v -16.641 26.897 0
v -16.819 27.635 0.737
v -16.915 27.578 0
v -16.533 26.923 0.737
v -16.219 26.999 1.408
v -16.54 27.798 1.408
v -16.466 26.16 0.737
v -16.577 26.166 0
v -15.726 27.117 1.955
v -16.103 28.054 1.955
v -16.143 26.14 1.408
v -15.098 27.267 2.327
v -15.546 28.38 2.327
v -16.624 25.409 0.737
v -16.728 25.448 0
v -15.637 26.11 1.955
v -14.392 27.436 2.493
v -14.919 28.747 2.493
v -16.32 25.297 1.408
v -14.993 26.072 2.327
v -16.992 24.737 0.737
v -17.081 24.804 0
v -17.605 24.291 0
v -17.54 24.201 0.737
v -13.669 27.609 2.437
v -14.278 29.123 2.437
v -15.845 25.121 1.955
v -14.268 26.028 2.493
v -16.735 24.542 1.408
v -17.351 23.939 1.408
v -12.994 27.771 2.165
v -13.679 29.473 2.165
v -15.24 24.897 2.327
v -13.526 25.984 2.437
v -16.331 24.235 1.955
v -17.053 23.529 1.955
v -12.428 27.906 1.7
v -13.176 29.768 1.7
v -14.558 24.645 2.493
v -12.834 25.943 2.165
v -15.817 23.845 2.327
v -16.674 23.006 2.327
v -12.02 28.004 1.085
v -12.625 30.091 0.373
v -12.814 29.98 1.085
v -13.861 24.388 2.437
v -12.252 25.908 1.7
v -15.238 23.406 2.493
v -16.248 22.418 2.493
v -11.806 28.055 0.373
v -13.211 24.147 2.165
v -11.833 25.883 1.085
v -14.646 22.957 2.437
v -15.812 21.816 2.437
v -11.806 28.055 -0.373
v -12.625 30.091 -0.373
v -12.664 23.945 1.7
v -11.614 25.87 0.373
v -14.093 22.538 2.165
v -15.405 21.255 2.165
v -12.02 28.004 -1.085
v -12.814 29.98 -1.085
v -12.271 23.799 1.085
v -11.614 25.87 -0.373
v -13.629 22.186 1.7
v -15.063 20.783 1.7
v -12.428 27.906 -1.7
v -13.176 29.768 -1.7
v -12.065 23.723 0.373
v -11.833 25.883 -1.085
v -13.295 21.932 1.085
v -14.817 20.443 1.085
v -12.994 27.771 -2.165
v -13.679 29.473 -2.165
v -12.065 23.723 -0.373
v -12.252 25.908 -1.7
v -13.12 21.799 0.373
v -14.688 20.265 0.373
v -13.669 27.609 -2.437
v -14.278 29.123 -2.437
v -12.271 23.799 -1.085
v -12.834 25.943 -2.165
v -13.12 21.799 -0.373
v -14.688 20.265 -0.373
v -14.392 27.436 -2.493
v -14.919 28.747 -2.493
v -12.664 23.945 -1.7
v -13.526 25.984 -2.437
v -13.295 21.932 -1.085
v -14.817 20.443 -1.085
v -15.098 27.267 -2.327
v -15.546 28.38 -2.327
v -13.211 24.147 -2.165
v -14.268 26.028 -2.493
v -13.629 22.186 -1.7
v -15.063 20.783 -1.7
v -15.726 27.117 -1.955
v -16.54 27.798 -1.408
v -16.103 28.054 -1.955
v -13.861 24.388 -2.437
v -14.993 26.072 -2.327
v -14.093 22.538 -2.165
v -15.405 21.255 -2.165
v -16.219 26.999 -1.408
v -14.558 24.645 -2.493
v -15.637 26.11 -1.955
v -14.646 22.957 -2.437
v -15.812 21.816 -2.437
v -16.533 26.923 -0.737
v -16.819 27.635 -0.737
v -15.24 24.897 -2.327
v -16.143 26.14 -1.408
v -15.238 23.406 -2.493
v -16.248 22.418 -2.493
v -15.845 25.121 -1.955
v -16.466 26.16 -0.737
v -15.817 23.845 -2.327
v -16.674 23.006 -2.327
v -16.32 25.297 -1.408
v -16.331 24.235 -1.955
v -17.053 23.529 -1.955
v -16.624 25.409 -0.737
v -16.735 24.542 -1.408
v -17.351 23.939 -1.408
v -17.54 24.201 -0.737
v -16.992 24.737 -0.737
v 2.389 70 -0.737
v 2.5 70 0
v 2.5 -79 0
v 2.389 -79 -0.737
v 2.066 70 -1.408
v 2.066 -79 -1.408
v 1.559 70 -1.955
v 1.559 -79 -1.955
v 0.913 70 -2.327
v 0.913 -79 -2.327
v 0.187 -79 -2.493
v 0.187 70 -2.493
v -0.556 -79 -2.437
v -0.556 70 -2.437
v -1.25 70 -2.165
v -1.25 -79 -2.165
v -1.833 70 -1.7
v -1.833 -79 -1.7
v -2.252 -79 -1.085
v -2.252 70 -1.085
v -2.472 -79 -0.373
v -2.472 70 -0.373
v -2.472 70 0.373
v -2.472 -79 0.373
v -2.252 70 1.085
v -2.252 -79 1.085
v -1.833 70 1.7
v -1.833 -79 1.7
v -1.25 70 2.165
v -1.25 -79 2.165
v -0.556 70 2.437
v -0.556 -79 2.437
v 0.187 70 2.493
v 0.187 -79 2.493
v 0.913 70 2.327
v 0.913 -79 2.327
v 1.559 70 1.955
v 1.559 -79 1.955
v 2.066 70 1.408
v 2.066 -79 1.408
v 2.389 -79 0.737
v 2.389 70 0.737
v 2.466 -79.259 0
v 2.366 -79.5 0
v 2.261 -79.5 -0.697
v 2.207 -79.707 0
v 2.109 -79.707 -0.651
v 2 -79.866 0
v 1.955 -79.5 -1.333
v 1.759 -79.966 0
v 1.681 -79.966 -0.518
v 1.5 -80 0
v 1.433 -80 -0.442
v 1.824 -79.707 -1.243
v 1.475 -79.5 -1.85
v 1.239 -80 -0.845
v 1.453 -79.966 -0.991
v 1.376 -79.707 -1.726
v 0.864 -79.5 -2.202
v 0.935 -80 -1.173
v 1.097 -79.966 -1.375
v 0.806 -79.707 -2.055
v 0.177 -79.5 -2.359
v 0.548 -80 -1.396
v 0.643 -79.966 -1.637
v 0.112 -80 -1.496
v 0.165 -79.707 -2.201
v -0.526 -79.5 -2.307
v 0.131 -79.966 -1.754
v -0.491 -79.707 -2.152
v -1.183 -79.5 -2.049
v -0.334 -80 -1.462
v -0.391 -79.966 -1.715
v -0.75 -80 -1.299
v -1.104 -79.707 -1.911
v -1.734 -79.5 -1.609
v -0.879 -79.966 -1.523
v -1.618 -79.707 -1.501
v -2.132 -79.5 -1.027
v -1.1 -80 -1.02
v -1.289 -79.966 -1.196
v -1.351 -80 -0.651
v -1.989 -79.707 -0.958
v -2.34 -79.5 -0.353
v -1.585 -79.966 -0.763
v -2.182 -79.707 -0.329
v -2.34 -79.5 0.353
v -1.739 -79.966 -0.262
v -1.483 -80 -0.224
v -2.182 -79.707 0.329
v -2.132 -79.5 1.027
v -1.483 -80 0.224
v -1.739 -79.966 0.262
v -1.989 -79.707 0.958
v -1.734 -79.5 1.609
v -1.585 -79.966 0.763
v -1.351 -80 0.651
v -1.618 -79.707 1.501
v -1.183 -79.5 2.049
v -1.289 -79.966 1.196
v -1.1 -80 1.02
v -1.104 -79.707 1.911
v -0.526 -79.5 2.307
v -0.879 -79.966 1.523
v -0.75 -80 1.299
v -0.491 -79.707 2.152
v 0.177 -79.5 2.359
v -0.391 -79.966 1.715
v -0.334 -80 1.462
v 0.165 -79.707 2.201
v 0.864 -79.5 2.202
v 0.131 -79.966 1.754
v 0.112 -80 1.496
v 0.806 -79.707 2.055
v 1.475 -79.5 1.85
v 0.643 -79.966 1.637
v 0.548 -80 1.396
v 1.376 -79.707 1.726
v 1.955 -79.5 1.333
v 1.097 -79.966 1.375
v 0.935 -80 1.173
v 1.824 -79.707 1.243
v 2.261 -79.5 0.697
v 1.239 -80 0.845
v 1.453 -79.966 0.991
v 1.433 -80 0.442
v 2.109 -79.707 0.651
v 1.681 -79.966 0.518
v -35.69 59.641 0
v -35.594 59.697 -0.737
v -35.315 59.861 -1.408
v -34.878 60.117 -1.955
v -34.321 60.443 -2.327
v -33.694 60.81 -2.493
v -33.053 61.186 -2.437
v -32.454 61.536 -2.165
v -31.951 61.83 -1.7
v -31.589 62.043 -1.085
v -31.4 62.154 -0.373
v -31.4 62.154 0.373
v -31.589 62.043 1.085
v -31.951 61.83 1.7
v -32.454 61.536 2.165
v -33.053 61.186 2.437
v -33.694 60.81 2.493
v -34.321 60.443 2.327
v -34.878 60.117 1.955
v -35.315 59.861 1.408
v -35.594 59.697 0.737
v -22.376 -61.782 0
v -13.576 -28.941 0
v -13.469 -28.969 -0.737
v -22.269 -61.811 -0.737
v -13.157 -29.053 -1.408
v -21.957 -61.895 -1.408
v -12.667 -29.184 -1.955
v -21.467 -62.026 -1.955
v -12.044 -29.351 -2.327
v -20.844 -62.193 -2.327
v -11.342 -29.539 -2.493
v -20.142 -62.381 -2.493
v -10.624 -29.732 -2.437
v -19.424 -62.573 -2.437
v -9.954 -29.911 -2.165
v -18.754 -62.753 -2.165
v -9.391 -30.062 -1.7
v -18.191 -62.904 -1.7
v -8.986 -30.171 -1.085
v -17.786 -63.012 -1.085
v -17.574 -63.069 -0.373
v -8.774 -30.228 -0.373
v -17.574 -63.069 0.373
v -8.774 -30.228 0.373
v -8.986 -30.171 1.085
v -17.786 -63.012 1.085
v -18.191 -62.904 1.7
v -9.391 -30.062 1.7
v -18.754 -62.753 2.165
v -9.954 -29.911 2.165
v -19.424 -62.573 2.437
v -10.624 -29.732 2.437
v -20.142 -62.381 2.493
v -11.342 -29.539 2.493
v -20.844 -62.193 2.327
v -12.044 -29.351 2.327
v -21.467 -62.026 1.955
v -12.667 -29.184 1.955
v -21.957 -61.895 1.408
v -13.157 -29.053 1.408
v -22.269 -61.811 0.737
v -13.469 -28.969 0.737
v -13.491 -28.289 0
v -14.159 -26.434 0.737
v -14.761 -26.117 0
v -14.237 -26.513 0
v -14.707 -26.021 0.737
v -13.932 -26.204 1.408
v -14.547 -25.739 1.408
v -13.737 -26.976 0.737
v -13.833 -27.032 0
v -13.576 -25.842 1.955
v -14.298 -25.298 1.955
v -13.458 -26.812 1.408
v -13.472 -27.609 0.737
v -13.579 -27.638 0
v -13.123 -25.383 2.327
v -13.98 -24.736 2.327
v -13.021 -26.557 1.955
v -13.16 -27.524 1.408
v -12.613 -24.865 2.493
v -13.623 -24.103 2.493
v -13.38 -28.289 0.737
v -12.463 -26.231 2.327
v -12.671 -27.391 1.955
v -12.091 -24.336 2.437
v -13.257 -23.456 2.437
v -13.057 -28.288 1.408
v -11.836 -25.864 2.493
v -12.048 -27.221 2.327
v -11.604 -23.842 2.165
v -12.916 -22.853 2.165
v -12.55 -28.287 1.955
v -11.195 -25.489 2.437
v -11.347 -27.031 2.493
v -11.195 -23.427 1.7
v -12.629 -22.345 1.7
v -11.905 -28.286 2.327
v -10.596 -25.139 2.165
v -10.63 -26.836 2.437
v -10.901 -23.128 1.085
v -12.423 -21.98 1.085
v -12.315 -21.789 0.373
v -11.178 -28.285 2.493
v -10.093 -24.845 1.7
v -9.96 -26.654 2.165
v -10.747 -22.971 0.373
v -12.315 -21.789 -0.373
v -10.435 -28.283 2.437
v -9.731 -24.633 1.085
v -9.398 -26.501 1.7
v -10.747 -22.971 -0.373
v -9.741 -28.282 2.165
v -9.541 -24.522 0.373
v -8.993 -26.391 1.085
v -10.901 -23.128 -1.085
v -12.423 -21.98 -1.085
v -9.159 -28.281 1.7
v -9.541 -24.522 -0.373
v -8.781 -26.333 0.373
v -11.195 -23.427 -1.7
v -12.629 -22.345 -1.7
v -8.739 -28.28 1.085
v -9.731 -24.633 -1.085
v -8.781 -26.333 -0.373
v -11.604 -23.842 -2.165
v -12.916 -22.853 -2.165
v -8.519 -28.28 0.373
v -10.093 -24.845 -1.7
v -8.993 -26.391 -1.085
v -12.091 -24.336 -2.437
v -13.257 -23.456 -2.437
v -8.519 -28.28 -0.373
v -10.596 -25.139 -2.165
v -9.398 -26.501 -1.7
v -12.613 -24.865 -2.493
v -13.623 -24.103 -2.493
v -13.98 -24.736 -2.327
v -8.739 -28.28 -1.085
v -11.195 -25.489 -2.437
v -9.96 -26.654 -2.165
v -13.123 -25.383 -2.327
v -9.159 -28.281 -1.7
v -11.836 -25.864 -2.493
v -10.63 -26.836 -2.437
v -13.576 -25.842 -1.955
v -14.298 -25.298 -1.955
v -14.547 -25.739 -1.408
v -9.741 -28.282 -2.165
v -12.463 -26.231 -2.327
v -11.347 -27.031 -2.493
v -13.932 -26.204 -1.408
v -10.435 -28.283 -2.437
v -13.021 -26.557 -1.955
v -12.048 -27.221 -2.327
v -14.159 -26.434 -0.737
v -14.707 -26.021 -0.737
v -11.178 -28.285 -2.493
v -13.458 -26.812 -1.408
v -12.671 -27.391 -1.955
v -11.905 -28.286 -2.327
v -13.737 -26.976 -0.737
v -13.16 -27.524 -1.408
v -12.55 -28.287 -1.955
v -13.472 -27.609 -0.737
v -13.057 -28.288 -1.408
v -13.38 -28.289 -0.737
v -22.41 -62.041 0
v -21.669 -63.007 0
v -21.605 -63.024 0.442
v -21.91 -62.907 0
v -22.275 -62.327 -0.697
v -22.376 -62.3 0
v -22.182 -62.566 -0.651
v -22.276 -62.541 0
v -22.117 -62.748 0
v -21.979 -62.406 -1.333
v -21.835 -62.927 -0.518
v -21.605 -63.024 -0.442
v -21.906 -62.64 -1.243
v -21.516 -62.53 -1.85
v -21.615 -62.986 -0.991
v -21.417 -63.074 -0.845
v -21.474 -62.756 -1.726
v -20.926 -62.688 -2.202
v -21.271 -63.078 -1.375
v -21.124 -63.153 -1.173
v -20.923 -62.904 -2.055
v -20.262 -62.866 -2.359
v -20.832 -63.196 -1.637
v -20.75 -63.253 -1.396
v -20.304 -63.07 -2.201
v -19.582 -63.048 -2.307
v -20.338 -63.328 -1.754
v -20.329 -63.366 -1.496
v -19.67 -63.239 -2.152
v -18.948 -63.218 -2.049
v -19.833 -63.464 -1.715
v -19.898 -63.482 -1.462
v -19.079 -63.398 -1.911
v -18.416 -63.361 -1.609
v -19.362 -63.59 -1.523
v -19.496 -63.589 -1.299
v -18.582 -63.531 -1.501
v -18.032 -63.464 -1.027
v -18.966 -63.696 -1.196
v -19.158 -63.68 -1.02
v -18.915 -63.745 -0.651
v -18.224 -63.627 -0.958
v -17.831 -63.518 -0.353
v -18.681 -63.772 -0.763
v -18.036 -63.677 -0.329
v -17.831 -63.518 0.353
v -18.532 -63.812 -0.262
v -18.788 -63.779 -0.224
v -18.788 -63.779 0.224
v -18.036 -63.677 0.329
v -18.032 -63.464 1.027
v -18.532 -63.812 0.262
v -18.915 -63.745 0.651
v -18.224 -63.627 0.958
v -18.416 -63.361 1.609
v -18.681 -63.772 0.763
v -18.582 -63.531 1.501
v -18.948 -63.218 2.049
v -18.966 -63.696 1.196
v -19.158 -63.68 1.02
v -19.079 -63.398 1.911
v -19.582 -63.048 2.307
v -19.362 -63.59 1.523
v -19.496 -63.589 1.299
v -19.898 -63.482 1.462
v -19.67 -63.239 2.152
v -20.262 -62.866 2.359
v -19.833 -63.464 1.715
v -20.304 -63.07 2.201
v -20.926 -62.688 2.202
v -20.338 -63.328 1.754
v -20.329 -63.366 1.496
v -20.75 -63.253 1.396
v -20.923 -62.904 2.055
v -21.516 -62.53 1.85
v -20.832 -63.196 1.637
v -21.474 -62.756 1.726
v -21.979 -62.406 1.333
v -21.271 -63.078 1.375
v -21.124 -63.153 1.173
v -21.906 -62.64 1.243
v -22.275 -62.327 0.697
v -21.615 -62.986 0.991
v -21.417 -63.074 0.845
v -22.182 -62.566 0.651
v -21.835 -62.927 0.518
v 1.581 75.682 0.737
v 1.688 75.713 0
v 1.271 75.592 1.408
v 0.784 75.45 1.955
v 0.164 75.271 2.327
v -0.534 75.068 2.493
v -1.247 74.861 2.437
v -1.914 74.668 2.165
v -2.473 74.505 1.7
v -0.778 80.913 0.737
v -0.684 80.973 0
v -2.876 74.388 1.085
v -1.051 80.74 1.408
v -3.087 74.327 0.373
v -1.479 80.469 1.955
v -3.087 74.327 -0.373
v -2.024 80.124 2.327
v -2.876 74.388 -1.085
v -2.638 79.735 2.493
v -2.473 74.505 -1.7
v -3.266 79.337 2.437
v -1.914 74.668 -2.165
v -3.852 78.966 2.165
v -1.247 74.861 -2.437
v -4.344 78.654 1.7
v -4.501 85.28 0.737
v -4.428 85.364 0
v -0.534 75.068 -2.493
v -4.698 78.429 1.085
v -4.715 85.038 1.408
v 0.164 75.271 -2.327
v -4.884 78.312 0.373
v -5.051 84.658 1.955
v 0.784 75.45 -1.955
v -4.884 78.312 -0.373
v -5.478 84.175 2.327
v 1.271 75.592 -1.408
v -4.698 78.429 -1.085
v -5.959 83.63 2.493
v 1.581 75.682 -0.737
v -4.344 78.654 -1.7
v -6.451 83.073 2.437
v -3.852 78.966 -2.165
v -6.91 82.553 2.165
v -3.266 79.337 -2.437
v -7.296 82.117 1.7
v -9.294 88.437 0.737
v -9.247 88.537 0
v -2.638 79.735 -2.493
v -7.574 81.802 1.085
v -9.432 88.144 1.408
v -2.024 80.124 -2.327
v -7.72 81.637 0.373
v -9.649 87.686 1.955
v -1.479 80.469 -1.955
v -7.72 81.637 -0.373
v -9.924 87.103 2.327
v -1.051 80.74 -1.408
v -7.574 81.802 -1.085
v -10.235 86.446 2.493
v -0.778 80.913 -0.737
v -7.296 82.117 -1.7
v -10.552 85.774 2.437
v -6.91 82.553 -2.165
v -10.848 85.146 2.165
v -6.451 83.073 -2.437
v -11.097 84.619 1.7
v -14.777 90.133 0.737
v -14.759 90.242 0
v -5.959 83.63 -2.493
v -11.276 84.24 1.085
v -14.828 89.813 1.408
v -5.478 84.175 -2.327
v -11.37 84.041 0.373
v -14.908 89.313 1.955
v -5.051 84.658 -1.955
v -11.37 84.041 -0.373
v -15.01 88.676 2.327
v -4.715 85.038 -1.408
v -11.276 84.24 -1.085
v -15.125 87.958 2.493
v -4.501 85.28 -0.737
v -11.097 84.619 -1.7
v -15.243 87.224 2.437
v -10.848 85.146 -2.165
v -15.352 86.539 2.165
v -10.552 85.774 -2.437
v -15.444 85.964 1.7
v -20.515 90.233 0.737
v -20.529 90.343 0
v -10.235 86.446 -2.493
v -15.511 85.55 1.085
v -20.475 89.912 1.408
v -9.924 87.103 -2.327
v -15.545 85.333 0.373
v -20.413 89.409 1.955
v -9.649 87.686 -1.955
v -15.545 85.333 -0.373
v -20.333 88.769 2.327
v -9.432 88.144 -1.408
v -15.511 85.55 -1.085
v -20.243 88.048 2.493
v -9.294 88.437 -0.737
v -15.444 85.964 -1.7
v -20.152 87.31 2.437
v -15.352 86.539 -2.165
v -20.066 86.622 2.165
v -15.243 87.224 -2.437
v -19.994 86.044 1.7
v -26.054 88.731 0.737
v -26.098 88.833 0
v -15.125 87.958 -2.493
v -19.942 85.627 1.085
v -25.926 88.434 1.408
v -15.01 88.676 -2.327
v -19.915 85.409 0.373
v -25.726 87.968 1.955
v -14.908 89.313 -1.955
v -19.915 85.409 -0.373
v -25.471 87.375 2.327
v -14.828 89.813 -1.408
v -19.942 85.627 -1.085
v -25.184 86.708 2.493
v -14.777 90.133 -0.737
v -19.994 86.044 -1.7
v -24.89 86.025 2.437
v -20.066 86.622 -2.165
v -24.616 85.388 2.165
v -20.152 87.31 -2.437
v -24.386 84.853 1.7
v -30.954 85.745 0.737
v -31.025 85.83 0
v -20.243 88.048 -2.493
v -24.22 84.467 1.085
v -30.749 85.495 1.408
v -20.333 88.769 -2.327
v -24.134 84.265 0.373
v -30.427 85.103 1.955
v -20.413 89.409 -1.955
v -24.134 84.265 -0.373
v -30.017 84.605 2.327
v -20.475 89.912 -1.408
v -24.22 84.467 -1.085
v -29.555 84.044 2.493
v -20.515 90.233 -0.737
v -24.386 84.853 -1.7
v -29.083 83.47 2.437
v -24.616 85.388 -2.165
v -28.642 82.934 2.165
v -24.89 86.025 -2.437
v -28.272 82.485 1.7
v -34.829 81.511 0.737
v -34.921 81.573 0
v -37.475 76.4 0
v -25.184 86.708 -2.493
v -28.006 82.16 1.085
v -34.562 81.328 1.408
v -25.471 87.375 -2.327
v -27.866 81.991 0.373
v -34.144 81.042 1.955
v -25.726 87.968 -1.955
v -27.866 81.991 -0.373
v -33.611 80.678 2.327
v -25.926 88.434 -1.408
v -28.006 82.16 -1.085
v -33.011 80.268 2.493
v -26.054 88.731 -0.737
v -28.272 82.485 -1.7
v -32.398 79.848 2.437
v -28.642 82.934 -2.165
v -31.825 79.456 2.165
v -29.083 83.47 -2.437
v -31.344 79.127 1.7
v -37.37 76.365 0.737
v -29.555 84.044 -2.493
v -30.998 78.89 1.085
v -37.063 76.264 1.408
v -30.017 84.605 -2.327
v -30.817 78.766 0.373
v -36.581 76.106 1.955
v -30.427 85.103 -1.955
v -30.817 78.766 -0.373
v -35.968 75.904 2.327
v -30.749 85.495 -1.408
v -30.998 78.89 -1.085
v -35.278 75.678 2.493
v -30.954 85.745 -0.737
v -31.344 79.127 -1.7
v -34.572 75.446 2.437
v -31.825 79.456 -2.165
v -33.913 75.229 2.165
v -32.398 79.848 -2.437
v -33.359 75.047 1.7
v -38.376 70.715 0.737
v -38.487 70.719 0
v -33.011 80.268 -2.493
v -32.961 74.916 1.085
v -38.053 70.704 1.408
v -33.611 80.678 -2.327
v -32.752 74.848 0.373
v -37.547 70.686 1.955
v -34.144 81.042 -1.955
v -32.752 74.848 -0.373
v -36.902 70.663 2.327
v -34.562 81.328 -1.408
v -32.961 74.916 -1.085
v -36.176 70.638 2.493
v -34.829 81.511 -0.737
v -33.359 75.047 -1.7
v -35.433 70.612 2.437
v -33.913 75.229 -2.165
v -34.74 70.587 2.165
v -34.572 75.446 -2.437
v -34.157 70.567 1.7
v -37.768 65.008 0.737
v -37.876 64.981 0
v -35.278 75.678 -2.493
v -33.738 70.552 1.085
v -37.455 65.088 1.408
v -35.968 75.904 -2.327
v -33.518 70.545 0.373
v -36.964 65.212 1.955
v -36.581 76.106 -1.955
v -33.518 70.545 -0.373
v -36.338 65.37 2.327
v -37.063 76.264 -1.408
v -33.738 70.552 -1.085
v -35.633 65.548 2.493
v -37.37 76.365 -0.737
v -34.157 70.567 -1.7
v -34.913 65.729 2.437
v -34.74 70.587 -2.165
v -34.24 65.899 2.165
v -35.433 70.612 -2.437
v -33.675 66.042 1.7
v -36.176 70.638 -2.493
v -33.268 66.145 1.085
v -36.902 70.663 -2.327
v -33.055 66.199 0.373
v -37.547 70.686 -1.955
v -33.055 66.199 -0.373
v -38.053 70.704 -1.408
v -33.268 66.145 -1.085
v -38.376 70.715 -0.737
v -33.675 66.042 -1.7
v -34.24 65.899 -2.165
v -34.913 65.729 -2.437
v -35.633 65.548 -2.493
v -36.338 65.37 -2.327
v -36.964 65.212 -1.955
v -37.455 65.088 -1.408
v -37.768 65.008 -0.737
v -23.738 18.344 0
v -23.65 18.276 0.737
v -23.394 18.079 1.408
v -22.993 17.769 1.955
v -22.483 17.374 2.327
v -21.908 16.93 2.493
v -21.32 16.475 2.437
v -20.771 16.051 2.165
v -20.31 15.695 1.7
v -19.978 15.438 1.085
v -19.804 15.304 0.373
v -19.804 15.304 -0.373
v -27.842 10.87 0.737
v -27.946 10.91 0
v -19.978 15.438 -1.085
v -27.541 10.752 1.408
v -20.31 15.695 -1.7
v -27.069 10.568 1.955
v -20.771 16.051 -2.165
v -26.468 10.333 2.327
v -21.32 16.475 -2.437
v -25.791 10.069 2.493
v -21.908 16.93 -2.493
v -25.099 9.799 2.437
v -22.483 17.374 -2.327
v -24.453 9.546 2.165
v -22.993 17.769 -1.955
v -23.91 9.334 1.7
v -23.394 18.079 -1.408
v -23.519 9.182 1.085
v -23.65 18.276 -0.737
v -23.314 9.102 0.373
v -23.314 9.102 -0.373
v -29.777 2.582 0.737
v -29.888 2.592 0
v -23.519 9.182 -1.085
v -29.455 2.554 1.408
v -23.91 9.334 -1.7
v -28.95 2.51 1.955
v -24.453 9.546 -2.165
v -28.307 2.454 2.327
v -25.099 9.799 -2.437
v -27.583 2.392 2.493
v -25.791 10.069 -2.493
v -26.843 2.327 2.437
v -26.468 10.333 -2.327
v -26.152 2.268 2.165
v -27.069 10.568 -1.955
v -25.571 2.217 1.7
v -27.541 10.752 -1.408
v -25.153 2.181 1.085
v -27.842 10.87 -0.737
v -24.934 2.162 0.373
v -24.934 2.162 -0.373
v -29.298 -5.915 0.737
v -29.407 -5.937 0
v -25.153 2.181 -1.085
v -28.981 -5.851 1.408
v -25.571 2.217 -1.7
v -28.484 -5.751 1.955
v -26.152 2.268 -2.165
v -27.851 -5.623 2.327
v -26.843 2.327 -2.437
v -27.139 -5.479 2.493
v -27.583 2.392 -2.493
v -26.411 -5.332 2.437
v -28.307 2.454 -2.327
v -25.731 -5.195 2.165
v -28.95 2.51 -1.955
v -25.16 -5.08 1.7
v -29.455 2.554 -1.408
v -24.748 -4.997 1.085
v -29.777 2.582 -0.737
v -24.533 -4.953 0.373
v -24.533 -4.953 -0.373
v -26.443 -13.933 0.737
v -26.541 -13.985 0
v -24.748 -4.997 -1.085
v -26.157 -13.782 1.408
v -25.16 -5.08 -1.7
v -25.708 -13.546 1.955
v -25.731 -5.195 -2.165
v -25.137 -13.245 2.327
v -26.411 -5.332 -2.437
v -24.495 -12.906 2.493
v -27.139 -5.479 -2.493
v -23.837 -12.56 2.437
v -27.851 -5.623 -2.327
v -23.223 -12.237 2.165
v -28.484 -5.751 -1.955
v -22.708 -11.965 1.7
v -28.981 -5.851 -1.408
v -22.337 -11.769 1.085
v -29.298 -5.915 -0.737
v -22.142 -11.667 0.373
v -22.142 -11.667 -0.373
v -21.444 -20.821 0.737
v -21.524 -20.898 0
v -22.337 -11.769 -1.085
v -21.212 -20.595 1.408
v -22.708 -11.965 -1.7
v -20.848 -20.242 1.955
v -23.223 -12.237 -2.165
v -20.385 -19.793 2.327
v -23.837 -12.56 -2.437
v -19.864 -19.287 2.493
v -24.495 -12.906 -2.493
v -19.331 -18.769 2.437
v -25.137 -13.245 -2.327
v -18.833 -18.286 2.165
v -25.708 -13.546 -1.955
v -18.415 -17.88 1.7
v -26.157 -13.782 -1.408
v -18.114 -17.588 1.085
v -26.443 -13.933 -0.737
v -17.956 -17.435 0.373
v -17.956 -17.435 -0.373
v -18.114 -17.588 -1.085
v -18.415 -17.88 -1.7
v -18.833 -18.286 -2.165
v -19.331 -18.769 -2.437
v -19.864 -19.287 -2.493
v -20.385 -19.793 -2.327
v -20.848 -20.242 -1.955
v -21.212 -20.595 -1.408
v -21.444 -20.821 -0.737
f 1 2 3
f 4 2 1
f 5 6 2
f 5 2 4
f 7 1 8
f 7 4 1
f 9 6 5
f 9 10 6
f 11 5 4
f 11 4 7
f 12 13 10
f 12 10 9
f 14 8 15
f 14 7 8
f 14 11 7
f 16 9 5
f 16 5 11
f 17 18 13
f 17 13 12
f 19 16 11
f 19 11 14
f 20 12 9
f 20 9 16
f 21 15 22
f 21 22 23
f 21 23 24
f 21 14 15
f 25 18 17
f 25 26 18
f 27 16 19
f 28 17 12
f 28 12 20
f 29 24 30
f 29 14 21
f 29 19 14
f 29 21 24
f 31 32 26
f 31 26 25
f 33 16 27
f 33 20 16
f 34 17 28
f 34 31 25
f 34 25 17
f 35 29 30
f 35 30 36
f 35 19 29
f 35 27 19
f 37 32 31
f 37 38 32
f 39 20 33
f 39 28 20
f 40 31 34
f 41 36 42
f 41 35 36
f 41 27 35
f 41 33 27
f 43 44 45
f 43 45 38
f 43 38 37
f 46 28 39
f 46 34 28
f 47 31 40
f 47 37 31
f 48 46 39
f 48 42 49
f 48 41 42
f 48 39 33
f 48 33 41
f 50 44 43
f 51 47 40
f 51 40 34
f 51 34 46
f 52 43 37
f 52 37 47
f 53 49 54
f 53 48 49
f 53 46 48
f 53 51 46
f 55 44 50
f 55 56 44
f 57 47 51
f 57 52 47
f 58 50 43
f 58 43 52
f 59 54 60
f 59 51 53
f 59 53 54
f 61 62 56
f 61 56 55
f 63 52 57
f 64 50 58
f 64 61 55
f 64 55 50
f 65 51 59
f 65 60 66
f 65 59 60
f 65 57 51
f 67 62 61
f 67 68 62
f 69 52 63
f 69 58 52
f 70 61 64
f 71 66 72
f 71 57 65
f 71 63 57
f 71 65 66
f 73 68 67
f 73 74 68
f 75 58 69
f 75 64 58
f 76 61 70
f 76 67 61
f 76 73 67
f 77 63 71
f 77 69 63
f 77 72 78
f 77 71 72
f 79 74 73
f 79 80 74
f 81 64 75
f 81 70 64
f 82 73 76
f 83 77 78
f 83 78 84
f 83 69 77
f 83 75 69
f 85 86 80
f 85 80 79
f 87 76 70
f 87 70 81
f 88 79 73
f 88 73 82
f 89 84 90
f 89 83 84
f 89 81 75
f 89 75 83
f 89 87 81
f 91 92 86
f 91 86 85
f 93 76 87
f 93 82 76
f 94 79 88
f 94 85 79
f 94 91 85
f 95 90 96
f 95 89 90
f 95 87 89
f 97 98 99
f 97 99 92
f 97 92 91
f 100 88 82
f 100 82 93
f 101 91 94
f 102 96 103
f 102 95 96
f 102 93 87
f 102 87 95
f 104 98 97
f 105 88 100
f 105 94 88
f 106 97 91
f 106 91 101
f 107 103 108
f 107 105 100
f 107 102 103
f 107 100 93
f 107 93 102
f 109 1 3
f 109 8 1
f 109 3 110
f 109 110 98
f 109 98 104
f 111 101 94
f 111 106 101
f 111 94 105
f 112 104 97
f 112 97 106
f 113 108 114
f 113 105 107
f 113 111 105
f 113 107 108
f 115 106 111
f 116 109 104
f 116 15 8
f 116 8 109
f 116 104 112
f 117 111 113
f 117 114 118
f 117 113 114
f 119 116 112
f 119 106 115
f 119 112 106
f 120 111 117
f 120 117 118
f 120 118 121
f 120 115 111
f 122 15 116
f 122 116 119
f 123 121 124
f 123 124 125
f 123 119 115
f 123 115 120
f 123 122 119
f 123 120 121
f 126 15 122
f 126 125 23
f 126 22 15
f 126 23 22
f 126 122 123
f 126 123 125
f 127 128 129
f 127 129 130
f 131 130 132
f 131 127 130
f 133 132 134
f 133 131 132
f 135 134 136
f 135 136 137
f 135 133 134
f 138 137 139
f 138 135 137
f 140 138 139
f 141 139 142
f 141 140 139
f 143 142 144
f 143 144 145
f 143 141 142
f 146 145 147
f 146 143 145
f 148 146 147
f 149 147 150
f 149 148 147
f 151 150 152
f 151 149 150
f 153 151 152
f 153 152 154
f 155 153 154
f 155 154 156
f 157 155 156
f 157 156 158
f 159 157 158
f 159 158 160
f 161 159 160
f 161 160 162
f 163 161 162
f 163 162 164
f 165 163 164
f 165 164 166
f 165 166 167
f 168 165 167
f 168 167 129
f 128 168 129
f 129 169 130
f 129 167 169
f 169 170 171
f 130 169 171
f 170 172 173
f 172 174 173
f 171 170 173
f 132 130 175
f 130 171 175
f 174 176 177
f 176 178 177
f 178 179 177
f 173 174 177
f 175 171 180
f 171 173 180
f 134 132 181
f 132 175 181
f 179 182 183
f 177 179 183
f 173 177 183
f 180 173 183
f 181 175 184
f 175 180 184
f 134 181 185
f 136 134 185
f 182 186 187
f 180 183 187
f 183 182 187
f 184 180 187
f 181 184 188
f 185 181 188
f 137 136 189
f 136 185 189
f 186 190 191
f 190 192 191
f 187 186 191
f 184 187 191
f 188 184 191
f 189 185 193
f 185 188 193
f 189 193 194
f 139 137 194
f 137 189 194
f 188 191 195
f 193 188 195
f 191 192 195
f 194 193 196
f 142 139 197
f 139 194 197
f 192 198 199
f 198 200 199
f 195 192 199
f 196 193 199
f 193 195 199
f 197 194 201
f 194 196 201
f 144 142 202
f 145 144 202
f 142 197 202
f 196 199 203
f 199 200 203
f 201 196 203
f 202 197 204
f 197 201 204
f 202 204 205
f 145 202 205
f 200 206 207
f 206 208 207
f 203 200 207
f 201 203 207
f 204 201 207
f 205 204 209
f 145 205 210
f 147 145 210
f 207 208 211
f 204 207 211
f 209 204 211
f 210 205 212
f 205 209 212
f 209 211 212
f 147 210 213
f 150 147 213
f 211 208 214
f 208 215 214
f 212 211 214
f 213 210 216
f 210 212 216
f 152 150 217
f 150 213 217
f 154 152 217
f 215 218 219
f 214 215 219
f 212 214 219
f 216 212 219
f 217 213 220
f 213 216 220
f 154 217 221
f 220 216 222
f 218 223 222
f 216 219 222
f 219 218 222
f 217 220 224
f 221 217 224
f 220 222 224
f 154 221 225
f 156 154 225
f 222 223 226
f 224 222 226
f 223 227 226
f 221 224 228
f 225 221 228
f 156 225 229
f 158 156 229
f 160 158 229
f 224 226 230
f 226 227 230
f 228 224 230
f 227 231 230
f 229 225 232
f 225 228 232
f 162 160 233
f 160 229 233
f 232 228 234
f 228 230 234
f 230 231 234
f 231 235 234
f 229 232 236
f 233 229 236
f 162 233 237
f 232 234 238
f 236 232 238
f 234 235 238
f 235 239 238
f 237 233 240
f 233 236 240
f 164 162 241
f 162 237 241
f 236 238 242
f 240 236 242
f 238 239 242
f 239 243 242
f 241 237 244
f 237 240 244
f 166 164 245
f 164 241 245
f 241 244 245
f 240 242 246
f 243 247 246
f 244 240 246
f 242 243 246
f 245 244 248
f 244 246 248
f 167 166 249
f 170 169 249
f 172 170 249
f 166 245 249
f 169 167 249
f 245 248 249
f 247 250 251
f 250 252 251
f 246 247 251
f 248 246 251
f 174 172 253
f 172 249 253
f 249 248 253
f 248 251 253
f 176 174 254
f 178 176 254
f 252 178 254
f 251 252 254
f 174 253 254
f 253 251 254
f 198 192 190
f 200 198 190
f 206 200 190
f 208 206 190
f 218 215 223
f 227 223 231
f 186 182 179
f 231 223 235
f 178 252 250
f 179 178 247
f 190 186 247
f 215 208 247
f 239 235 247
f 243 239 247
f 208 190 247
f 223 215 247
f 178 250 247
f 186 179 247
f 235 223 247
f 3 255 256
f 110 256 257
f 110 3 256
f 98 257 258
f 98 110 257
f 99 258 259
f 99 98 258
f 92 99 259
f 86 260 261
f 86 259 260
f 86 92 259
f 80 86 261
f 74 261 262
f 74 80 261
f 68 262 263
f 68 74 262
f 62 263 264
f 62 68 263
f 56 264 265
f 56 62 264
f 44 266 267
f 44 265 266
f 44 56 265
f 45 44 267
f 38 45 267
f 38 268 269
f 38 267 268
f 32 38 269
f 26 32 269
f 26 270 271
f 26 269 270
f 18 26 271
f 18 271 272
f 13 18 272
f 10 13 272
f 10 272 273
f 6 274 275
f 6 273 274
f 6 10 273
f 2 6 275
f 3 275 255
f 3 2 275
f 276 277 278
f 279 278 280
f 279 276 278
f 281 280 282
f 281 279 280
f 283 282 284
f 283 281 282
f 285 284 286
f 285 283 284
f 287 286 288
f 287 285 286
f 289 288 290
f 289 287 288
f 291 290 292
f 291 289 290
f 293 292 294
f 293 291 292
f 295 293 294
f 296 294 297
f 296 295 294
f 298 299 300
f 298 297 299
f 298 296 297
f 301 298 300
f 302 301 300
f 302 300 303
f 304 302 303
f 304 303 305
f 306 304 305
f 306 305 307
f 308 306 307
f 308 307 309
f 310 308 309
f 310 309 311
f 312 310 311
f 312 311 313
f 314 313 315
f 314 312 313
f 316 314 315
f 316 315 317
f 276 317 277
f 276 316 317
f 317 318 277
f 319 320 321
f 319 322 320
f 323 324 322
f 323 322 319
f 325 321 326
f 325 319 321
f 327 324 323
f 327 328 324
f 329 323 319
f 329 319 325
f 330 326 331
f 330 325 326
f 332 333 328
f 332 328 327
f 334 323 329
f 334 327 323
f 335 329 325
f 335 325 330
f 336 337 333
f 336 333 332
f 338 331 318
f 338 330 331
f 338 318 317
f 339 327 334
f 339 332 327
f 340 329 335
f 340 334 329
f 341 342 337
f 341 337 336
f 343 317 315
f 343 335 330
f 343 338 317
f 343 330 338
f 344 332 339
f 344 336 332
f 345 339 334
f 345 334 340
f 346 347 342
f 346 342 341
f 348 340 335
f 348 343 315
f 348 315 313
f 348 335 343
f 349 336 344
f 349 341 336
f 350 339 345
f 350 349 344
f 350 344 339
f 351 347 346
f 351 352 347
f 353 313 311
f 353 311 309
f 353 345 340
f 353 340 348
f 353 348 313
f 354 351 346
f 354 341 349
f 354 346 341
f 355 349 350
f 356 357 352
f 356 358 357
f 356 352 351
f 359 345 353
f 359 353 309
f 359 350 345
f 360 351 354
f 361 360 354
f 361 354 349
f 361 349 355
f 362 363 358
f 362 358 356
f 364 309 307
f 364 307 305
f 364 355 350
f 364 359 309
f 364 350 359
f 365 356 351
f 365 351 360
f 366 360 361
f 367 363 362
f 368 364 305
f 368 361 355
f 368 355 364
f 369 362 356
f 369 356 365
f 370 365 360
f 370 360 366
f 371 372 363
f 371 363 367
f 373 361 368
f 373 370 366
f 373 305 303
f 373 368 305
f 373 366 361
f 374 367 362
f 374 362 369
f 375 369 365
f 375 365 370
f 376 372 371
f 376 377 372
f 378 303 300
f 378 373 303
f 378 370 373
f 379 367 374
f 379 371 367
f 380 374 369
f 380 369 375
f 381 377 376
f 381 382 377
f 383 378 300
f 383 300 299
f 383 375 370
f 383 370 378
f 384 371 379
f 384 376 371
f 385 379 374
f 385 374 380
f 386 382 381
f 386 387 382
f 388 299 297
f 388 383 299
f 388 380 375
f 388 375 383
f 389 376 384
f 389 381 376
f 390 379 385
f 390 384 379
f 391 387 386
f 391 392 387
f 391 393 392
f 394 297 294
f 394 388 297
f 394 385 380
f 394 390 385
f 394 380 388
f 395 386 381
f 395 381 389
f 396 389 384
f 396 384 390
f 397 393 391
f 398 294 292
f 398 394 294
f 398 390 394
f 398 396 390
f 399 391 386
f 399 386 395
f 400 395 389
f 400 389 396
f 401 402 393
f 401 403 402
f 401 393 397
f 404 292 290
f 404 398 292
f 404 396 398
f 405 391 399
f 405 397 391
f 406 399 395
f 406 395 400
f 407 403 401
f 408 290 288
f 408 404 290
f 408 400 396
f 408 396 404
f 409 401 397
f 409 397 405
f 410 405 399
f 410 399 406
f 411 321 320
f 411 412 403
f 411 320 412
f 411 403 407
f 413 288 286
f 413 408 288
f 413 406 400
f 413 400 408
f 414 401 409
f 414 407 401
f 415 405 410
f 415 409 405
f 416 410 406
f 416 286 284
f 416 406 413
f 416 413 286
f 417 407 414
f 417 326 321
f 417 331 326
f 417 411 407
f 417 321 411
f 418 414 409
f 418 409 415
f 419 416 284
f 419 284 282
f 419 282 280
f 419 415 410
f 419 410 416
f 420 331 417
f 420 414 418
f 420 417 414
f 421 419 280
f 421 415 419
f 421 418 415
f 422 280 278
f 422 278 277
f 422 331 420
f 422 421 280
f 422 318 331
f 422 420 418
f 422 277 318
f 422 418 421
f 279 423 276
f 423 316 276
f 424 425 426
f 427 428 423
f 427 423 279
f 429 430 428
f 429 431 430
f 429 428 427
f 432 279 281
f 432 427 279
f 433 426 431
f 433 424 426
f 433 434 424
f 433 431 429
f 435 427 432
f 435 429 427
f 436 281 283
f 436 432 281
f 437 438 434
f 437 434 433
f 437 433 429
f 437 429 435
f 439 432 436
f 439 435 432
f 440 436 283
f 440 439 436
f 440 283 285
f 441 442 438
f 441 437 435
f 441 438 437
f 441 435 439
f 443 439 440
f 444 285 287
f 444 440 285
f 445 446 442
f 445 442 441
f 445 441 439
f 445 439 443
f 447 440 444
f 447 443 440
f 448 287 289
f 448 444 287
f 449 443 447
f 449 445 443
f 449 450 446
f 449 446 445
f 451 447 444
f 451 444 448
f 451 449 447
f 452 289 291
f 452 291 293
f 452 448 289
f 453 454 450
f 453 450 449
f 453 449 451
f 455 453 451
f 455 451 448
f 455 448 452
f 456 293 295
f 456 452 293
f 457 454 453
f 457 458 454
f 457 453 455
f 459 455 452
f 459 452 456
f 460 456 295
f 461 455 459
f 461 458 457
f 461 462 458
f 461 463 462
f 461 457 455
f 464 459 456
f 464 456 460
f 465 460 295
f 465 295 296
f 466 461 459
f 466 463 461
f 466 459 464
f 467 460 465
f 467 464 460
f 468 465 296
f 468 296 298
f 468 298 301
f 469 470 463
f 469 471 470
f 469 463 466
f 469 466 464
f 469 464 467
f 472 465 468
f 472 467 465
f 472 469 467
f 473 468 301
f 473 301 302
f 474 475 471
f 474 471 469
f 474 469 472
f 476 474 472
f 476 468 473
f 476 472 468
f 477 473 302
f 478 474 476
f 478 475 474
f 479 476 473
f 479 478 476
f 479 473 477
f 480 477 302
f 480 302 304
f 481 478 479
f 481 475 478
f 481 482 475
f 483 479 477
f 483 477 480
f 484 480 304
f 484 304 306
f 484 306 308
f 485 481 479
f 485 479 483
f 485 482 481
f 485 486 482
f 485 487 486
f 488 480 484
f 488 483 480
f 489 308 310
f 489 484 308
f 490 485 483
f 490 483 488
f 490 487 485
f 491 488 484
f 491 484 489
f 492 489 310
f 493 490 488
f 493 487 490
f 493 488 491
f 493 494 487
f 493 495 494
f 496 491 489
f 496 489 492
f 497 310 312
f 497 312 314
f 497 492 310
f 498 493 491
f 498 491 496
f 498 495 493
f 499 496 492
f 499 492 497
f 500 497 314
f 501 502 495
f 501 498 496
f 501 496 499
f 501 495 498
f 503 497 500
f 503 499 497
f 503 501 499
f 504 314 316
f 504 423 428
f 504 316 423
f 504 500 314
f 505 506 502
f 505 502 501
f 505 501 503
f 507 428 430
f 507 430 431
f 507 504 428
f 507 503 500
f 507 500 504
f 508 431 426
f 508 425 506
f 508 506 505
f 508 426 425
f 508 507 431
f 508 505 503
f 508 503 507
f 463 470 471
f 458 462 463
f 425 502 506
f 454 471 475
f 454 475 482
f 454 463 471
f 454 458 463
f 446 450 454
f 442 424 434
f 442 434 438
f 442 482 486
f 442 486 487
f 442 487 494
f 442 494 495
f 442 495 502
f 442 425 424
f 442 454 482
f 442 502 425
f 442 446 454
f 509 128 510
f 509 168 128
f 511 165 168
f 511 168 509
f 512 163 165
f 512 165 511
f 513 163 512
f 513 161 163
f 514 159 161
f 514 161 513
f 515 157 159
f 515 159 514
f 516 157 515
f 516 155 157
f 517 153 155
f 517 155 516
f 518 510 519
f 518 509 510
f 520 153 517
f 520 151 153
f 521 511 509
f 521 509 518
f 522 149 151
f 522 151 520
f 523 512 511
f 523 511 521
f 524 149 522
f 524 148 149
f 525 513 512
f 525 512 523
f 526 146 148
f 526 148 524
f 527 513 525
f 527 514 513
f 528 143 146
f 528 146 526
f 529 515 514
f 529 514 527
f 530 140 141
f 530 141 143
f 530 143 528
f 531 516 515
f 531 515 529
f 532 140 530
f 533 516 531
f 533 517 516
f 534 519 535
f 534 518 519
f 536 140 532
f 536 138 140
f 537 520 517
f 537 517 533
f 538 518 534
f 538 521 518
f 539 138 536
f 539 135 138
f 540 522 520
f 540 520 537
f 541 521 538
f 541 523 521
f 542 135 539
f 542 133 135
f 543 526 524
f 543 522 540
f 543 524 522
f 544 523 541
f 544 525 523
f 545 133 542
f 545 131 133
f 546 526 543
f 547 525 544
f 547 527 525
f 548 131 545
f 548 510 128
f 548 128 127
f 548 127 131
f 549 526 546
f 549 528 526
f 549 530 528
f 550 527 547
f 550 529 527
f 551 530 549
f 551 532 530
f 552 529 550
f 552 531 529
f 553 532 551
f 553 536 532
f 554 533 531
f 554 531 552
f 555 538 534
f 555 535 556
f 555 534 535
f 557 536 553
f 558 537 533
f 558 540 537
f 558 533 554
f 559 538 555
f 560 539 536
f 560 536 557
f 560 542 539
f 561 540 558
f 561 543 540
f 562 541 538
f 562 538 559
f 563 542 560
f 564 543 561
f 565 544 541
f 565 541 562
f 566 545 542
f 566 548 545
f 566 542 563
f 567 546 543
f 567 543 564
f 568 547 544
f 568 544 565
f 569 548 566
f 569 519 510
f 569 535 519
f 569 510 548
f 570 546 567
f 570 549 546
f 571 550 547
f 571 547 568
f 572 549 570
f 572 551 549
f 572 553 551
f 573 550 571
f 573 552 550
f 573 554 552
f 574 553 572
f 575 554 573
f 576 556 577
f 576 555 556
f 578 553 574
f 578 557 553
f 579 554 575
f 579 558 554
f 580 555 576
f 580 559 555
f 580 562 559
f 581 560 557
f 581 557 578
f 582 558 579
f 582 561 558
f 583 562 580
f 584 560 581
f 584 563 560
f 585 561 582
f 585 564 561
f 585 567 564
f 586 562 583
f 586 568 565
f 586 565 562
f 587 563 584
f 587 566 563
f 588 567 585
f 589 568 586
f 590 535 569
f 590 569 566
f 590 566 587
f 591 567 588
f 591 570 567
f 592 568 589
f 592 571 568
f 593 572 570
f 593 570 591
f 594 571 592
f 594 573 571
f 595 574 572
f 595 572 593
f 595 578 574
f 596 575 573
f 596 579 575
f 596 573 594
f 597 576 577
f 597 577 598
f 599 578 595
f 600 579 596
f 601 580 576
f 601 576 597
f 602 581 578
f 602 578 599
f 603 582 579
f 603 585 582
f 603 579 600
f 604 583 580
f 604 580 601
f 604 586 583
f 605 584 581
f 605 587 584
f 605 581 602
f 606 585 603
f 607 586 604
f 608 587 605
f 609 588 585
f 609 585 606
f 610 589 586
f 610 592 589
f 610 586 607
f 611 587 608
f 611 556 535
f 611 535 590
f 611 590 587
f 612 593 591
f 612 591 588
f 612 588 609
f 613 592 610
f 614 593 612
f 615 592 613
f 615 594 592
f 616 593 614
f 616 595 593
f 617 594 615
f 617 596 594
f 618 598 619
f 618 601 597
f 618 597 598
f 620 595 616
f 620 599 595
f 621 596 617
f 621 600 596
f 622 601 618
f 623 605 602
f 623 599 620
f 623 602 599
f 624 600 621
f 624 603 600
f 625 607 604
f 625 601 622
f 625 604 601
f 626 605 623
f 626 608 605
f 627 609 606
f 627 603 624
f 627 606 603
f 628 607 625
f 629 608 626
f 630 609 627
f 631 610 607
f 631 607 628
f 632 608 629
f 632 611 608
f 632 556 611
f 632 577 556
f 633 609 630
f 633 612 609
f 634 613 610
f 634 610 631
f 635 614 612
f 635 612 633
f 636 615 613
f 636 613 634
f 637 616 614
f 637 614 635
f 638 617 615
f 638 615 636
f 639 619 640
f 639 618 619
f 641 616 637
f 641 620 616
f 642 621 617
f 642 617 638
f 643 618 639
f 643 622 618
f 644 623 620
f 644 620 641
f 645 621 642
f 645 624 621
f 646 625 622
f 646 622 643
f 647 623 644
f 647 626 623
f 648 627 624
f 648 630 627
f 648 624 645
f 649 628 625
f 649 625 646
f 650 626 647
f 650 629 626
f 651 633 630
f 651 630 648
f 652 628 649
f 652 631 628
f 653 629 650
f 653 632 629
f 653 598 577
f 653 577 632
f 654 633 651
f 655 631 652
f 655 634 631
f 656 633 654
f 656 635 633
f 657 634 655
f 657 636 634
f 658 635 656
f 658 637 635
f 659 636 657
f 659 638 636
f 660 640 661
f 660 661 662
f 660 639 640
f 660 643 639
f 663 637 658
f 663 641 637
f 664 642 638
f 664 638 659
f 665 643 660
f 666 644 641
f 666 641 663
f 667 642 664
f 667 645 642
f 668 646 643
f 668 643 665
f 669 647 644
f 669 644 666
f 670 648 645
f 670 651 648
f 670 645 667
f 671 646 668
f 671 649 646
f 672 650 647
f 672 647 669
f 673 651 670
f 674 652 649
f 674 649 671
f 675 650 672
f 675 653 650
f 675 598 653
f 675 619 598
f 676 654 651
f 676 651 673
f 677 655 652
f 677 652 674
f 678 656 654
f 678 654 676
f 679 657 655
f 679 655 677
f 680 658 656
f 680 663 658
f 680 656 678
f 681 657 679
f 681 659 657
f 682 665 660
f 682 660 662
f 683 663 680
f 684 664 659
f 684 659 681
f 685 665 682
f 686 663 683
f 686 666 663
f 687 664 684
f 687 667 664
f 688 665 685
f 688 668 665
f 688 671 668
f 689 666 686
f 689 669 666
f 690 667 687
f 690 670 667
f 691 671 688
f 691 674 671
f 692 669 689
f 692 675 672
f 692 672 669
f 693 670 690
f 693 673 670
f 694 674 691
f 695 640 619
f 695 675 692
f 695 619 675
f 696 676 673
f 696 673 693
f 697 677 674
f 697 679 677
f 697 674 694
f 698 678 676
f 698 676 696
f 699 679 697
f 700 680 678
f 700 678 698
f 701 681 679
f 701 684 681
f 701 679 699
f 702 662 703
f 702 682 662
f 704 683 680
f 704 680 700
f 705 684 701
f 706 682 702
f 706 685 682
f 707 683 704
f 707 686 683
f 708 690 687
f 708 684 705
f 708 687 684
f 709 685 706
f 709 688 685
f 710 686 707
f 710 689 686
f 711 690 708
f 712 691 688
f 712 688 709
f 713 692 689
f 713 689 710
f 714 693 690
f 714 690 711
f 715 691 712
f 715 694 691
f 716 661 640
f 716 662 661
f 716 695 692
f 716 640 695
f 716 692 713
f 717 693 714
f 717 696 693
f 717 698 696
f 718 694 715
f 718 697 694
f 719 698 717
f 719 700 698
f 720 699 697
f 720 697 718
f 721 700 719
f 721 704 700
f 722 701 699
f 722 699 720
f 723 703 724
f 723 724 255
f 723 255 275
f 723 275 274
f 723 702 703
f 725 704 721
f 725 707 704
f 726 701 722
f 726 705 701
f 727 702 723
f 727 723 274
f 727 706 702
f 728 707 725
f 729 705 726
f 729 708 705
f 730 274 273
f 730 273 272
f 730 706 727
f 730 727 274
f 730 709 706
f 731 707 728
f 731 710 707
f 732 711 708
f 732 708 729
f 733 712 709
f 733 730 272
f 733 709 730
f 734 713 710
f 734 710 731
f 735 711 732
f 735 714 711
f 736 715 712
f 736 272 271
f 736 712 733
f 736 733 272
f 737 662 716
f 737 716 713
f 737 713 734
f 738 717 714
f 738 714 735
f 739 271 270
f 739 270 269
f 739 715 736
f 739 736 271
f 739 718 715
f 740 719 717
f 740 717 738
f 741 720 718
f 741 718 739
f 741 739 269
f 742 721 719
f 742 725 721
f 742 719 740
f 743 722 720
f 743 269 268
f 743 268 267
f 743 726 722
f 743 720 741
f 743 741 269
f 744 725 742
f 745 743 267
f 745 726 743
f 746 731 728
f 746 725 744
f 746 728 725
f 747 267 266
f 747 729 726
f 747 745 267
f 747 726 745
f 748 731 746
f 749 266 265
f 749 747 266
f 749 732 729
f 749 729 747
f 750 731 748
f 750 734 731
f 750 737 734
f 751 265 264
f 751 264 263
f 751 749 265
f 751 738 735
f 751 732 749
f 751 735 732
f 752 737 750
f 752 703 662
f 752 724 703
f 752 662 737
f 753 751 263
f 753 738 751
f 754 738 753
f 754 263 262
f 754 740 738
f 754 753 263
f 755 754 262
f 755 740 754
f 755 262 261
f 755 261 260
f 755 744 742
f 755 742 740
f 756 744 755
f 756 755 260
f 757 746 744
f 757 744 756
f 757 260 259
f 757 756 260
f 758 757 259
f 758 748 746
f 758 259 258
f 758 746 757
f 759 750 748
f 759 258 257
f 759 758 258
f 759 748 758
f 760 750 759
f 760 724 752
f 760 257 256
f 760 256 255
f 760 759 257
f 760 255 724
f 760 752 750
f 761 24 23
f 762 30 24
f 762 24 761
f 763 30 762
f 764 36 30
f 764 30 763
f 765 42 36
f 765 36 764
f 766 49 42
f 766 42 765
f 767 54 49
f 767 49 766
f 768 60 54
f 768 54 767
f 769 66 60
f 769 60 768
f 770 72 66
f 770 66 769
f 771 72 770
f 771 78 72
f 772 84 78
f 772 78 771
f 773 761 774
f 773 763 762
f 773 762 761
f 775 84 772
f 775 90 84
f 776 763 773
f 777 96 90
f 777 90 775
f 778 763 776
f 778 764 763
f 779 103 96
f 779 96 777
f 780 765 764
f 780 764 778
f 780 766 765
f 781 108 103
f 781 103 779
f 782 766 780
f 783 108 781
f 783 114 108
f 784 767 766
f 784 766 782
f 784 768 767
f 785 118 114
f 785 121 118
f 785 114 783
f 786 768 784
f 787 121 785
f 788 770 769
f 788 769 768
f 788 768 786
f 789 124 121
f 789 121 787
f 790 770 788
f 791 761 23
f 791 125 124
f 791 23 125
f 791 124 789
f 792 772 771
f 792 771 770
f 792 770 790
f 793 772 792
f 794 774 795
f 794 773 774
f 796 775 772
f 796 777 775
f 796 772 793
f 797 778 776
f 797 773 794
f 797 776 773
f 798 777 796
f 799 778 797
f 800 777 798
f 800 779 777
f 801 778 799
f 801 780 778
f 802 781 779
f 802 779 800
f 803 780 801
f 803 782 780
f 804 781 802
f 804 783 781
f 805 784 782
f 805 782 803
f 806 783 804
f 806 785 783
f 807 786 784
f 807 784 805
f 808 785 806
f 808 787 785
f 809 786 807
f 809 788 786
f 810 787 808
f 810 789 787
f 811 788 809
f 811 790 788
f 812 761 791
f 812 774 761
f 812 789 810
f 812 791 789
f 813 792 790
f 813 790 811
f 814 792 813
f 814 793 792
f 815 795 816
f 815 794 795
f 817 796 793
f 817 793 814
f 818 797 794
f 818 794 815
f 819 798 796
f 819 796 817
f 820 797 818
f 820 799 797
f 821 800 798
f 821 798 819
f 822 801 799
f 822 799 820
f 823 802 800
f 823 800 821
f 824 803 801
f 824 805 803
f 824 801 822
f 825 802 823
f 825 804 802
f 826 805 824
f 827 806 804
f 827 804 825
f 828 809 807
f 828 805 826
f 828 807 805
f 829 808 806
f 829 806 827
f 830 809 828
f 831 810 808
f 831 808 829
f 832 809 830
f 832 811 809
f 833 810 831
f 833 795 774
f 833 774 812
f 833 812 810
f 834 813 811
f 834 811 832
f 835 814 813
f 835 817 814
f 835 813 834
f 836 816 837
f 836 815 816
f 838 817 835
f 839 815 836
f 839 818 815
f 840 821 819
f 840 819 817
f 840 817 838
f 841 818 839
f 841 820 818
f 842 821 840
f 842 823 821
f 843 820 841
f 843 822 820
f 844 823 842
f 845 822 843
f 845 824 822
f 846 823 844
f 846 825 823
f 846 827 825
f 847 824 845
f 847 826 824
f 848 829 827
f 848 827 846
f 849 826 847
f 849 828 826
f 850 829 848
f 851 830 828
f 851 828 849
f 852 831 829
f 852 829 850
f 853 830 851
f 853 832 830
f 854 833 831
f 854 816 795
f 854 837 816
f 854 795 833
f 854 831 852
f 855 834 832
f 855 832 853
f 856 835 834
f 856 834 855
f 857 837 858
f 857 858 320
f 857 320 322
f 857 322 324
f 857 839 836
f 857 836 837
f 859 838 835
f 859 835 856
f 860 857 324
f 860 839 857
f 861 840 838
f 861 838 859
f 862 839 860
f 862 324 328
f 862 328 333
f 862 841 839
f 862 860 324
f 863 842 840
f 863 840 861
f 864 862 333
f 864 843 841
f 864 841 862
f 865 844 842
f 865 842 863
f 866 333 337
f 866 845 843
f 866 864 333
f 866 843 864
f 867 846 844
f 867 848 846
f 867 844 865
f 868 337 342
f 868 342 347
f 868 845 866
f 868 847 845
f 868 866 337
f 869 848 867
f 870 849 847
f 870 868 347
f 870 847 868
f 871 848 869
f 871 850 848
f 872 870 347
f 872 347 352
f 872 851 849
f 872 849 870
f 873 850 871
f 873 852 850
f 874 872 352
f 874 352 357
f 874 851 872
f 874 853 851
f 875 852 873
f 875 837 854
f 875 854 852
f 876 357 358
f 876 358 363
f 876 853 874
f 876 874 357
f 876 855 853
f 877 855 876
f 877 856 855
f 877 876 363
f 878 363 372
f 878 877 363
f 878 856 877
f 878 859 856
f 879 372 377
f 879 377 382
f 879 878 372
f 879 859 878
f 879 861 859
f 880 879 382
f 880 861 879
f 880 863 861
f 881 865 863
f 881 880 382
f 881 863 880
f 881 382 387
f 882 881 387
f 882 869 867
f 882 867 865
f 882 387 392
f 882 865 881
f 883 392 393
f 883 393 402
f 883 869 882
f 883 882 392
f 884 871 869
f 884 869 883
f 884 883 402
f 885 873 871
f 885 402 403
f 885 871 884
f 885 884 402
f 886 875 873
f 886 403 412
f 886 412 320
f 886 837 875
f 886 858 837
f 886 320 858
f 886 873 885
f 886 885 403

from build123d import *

# Parameters (mm, degrees)
SKETCH2_R = 2.5
FILLET1_R = 1


with BuildPart() as part:
    # Sweep1: sweep along a path in Sketch1
    with BuildLine(Plane.XY) as sweep1_path:
        Line((0, -80), (0, 70))
        ThreePointArc((0, 70), (-22.712119009, 87.372274878), (-33.532881605, 60.904419258))
        Line((-33.532881605, 60.904419258), (-14.757917224, 28.841672836))
        ThreePointArc((-14.757917224, 28.841672836), (-14.179292041, 25.28776046), (-16.138359396, 22.266642226))
        ThreePointArc((-16.138359396, 22.266642226), (-27.456326157, -1.549243036), (-13.53107327, -23.940761395))
        ThreePointArc((-13.53107327, -23.940761395), (-11.380690743, -26.359053874), (-11.161639279, -29.587722328))
        Line((-11.161639279, -29.587722328), (-20.220305857, -63.395126248))
    # Sketch2 → Sweep1 (sweep)
    with BuildSketch(Plane(origin=(0, -80, 0), x_dir=(1, 0, 0), z_dir=(0, 1, 0))):
        Circle(SKETCH2_R)
    sweep(path=sweep1_path.line)

    # Fillet1
    fillet1_edges = [part.edges().sort_by_distance(p)[0] for p in [
        (-17.805491292, -64.042173861, 0),
        (-2.5, -80, 0),
    ]]
    fillet(fillet1_edges, radius=FILLET1_R)


solid = part.part
